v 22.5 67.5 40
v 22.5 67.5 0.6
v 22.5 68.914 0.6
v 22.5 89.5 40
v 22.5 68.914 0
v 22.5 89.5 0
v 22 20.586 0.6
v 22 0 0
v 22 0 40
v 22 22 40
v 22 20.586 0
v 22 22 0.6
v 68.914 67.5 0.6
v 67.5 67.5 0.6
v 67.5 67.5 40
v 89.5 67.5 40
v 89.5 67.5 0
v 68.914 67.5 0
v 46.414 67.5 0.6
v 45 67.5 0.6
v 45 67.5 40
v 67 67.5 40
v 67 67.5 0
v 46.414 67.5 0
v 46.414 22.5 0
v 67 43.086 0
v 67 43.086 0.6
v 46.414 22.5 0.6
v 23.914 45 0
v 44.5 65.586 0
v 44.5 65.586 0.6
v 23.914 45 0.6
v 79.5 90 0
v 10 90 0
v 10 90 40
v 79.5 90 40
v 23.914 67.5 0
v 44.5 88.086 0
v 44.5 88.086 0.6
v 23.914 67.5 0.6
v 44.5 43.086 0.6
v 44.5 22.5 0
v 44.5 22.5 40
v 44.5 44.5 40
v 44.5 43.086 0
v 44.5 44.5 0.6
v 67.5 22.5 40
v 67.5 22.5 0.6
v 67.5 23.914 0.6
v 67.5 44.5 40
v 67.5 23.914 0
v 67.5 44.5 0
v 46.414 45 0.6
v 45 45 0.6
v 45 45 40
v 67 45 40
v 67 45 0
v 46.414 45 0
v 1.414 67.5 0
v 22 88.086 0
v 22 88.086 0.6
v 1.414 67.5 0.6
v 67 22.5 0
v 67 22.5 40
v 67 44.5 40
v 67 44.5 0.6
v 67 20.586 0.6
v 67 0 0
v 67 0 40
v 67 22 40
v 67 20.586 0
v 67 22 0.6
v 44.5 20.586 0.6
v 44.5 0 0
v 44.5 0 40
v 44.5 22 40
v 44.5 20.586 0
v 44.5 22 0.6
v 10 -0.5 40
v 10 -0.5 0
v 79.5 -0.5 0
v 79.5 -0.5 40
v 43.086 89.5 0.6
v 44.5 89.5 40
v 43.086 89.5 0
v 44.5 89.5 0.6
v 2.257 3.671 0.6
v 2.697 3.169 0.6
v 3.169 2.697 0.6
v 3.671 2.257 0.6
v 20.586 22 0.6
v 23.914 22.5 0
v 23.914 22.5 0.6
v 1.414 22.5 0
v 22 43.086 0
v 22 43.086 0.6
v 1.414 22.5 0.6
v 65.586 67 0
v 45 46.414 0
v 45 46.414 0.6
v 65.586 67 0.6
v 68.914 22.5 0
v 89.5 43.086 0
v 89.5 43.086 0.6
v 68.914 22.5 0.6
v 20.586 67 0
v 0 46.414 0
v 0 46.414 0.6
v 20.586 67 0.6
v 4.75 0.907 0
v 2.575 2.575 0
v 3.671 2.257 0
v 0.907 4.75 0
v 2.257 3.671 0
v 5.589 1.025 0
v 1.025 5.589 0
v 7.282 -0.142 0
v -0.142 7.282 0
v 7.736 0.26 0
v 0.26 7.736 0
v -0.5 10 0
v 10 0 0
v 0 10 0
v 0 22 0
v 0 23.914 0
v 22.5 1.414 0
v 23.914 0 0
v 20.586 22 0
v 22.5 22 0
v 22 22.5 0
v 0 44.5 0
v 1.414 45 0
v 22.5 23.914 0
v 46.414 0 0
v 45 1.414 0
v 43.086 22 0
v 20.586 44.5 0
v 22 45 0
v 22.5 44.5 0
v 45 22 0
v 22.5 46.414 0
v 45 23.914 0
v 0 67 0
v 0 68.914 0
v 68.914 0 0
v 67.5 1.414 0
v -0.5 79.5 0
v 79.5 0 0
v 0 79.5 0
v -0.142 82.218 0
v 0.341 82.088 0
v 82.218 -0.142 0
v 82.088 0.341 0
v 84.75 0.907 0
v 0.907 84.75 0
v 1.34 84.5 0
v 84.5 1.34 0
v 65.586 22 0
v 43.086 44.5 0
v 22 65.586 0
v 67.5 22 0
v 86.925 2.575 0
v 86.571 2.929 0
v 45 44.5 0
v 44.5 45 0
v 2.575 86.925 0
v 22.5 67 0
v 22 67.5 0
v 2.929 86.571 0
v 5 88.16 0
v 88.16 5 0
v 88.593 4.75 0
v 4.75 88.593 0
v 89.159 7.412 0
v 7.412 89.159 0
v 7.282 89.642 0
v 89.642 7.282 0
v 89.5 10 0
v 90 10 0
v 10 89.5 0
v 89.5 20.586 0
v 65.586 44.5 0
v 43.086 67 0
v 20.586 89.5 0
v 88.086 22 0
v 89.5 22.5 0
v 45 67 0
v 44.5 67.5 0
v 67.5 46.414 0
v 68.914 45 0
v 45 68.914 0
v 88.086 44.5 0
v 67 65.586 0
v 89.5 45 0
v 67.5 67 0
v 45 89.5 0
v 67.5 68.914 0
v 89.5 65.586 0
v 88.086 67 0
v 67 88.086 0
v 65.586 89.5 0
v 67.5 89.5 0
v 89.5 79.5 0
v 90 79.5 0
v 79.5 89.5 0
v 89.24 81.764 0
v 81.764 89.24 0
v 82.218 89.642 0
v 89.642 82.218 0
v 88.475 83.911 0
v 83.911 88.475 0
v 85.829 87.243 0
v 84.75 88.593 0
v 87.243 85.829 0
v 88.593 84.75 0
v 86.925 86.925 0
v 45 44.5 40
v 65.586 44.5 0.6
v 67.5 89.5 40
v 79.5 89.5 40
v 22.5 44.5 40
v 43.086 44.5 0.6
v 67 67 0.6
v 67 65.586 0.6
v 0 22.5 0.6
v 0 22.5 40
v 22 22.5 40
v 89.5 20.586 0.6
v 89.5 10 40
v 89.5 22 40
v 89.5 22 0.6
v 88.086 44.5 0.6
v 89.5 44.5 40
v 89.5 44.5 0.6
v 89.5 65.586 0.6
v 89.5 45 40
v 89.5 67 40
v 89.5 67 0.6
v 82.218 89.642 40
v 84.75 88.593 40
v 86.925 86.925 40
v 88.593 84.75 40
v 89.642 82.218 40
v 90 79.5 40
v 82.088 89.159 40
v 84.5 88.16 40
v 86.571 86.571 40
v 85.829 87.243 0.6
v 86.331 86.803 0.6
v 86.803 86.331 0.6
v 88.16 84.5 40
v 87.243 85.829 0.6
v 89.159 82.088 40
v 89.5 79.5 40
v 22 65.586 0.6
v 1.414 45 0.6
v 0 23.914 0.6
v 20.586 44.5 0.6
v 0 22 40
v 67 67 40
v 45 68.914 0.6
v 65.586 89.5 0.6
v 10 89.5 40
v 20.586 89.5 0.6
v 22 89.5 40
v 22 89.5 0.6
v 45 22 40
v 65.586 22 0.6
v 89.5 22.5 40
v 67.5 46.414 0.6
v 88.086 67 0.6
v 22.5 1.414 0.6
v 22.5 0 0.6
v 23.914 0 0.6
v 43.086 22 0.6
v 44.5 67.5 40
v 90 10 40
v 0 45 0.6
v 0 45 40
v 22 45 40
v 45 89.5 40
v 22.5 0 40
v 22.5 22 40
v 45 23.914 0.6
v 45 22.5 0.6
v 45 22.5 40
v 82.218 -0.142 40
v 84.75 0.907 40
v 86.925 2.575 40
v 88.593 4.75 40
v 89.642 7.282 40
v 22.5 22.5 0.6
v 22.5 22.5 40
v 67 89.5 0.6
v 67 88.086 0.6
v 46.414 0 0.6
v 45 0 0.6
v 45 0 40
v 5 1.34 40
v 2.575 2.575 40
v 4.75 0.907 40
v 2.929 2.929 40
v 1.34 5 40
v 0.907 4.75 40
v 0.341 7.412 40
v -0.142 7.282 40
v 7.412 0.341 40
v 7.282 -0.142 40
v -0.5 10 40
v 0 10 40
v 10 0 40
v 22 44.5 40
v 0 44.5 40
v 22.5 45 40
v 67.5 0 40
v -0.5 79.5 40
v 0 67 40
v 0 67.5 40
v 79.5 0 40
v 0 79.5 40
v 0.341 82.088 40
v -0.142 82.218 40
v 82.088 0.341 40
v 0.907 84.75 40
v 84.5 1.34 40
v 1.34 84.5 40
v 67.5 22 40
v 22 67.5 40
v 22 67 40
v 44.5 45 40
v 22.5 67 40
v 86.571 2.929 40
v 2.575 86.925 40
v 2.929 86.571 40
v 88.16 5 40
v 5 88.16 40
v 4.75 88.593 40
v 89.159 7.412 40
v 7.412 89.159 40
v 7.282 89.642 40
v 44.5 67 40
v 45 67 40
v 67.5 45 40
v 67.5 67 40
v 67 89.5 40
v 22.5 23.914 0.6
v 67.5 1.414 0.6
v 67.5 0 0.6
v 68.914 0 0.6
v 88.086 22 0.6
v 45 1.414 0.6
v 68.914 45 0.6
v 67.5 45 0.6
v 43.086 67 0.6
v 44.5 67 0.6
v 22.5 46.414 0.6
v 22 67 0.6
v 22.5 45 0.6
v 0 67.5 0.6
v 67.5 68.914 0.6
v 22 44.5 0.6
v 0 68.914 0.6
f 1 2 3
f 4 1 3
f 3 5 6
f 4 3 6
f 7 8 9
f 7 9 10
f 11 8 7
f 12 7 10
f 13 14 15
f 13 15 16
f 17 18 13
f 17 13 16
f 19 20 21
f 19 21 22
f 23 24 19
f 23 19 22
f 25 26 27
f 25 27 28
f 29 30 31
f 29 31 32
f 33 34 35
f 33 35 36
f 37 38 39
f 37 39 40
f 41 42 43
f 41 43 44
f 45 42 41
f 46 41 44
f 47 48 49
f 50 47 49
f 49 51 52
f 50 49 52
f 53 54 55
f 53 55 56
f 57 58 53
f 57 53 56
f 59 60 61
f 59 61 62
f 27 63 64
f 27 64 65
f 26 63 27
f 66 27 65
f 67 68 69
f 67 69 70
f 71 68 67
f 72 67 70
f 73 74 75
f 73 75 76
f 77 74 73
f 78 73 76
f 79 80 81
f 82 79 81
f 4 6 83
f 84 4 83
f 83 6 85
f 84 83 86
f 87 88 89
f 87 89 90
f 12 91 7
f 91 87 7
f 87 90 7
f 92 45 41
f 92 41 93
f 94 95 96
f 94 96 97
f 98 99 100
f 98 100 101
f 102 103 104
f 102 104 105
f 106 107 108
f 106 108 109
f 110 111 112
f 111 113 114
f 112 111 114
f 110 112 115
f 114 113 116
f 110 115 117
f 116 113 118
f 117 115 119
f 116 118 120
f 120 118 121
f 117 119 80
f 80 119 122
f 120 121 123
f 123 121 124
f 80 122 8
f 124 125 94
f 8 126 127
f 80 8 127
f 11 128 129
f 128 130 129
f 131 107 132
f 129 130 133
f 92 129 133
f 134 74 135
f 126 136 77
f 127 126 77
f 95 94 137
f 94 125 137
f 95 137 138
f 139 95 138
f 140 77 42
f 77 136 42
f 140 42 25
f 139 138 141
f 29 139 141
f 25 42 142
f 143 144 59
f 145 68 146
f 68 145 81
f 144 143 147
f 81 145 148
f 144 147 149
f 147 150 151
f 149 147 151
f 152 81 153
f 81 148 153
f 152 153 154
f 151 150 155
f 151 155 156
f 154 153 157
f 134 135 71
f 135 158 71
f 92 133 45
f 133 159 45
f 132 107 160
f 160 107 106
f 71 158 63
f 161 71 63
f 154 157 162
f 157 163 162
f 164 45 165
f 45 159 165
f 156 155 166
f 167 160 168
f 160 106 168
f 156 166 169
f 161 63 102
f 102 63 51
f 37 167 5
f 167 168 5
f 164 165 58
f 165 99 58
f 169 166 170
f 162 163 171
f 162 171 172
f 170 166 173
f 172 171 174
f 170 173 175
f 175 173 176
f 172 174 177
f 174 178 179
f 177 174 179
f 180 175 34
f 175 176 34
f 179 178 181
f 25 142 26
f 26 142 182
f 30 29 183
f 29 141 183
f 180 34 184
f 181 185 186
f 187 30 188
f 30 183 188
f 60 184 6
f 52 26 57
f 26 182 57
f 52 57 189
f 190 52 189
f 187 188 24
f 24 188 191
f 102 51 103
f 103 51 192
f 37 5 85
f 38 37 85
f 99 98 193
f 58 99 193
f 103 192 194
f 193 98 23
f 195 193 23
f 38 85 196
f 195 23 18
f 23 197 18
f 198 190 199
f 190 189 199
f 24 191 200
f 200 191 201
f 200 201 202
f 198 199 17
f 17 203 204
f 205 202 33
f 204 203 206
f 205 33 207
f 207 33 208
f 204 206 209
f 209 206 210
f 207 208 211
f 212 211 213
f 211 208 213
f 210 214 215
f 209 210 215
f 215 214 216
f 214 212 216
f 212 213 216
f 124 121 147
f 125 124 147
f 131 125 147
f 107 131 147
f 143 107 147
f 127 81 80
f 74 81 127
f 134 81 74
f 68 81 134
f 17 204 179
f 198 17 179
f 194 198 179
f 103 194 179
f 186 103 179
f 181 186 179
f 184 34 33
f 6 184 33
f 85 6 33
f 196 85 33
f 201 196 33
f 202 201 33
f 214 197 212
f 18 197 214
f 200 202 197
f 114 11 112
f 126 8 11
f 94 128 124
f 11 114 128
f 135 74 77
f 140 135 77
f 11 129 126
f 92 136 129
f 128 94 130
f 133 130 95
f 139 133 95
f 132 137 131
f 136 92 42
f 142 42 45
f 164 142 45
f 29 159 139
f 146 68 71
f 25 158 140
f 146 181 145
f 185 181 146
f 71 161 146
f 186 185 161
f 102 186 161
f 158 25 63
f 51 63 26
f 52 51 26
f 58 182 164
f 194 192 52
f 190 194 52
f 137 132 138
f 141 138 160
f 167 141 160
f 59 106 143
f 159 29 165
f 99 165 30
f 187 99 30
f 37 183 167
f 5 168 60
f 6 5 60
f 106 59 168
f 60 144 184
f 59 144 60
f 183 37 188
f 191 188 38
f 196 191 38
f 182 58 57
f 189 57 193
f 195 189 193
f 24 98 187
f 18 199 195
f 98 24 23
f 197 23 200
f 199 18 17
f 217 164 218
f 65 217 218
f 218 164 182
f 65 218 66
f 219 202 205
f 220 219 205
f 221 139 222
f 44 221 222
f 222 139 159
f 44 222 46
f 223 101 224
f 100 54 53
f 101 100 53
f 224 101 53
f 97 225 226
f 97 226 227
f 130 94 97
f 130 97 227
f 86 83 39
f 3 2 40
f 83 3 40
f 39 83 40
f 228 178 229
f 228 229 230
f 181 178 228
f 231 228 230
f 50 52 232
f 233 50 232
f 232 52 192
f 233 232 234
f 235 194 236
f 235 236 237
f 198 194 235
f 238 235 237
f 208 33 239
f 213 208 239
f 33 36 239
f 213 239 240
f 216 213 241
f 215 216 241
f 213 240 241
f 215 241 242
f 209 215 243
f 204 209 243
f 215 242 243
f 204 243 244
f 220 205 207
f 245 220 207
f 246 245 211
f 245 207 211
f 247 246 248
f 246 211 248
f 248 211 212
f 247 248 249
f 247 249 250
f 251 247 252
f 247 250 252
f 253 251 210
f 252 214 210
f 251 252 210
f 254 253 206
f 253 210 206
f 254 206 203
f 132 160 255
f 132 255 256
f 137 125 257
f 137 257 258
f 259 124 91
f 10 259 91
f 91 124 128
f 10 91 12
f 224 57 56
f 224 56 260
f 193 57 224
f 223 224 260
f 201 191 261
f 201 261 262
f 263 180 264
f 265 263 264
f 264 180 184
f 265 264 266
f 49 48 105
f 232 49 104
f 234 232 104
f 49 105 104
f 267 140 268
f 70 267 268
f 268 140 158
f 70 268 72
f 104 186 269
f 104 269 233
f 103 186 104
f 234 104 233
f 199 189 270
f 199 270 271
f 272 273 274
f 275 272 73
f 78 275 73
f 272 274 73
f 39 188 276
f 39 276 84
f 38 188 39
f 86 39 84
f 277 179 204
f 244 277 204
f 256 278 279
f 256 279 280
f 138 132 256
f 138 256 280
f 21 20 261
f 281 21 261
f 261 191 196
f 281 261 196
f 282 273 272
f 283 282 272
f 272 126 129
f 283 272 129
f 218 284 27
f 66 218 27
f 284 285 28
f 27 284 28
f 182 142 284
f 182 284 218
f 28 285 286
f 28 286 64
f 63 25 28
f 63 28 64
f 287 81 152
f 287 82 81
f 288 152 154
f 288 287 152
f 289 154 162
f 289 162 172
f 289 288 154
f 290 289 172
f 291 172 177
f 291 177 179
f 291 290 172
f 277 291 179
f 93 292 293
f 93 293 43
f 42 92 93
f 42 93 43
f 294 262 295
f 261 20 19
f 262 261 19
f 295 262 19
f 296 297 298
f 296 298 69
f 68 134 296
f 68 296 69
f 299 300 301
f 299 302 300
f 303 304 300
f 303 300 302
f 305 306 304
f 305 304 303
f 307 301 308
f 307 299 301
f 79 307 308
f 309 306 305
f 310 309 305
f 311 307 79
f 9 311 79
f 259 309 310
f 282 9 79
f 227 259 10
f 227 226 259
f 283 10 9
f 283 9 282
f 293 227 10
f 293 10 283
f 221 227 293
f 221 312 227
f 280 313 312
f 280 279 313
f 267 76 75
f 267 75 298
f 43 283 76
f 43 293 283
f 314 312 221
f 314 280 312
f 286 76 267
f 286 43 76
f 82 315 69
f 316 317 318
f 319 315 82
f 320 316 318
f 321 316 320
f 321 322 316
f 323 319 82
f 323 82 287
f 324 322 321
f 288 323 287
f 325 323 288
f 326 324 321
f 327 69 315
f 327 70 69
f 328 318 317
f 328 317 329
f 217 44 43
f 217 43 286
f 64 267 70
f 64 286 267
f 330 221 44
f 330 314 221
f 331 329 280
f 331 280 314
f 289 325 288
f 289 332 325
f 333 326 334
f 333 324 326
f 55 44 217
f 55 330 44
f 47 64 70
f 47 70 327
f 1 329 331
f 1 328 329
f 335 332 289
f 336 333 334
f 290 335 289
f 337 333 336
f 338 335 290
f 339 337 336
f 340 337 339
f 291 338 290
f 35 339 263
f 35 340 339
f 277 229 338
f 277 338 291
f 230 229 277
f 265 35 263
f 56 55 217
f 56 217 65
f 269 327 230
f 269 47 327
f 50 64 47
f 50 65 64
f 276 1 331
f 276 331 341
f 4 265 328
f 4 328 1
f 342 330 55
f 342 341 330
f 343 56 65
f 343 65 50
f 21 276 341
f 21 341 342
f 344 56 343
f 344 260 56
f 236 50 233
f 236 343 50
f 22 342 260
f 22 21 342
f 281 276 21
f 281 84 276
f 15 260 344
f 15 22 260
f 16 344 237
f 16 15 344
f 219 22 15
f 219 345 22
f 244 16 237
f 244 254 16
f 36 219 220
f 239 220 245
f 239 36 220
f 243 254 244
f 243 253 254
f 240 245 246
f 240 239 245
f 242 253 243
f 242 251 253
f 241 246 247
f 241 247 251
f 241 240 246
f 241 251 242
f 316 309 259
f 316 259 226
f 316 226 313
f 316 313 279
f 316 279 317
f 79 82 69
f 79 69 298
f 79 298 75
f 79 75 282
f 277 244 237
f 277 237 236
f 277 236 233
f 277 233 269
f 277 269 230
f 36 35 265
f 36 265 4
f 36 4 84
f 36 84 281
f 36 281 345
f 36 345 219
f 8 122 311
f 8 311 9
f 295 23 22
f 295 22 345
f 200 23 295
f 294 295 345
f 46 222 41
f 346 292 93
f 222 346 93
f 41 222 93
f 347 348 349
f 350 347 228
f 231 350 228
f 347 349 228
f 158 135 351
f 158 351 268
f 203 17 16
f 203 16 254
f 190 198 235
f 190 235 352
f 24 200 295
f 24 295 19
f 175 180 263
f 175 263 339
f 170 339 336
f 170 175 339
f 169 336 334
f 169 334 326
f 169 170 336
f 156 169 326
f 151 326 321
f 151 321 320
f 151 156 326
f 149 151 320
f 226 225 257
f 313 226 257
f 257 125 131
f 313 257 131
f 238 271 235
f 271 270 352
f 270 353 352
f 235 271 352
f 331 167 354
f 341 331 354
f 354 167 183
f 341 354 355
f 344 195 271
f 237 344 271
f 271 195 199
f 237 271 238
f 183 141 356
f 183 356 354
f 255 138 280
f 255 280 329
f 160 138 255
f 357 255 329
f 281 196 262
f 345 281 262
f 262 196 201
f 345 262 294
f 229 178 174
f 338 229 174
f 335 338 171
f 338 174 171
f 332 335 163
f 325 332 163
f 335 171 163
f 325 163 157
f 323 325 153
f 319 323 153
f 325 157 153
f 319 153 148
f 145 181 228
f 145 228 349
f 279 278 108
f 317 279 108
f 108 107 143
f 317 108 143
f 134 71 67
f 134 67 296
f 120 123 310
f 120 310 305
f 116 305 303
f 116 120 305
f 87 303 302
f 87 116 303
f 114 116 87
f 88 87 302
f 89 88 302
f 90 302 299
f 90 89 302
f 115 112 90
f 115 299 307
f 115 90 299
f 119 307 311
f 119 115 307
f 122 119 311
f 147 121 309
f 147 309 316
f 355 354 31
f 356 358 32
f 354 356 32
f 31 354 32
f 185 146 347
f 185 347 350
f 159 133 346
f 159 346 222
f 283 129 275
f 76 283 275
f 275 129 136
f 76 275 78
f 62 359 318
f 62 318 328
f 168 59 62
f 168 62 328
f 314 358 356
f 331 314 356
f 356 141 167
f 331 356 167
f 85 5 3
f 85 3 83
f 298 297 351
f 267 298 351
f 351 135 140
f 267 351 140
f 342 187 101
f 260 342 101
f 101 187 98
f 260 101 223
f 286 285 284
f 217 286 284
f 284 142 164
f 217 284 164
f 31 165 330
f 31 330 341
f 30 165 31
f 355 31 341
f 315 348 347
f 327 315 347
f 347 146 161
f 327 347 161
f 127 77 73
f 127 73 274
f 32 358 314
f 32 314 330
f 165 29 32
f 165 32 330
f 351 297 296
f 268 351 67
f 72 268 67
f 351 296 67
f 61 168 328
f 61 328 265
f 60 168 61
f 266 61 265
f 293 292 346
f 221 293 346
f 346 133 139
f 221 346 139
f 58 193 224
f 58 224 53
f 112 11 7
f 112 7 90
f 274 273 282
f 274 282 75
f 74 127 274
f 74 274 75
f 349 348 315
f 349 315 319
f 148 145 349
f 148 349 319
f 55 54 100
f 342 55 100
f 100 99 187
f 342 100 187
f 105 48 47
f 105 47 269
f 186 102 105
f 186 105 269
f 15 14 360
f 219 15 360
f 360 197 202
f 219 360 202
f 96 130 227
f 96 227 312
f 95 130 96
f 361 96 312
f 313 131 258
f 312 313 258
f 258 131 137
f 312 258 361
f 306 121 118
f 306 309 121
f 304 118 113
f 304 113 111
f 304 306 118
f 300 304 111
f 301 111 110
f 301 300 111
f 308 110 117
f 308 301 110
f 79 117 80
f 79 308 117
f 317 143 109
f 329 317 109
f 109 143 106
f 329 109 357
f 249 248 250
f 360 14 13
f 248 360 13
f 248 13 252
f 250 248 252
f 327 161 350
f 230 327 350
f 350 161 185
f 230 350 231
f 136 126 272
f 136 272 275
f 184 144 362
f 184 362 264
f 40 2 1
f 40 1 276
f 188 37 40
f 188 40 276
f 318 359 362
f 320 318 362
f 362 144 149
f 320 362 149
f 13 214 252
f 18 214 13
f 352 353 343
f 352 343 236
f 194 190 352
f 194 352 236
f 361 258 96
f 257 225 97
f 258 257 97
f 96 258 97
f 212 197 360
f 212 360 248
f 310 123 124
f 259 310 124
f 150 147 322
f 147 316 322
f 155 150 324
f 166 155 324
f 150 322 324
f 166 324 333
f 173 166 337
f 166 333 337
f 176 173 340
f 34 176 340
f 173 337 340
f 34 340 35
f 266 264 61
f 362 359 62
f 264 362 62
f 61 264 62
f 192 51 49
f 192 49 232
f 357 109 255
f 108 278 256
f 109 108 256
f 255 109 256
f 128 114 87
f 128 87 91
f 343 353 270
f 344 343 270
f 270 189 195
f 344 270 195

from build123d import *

# Parameters (mm, degrees)
F1_W         = 90.5
F1_H         = 90.5
F1_W_2       = 22
F1_H_2       = 22
F2_DEPTH     = 40
F4_DEPTH     = 0.6
F5_T1_DEPTH  = 40
F5_T6_DEPTH  = 64.4
F5_T11_DEPTH = 64.4
F6_R         = 10.5


# Not quite as in the source:
# - a fillet or chamfer that OpenCascade refuses, or shapes differently, is made with other operations: its cross-section is extruded or revolved along the edge and cut away or added


with BuildPart() as f2:
    # F1 (on Top) → F2 (new body)
    with BuildSketch(Plane.XY):
        with Locations((44.75, 44.75)):
            Rectangle(F1_W, F1_H)
        with Locations((11, 11)):
            Rectangle(F1_W_2, F1_H_2, mode=Mode.SUBTRACT)
        with Locations((33.5, 11)):
            Rectangle(F1_W_2, F1_H_2, mode=Mode.SUBTRACT)
        with Locations((11, 33.5)):
            Rectangle(F1_W_2, F1_H_2, mode=Mode.SUBTRACT)
        with Locations((33.5, 33.5)):
            Rectangle(F1_W_2, F1_H_2, mode=Mode.SUBTRACT)
        with Locations((56, 11)):
            Rectangle(F1_W_2, F1_H_2, mode=Mode.SUBTRACT)
        with Locations((78.5, 11)):
            Rectangle(F1_W_2, F1_H_2, mode=Mode.SUBTRACT)
        with Locations((56, 33.5)):
            Rectangle(F1_W_2, F1_H_2, mode=Mode.SUBTRACT)
        with Locations((78.5, 33.5)):
            Rectangle(F1_W_2, F1_H_2, mode=Mode.SUBTRACT)
        with Locations((11, 56)):
            Rectangle(F1_W_2, F1_H_2, mode=Mode.SUBTRACT)
        with Locations((33.5, 56)):
            Rectangle(F1_W_2, F1_H_2, mode=Mode.SUBTRACT)
        with Locations((11, 78.5)):
            Rectangle(F1_W_2, F1_H_2, mode=Mode.SUBTRACT)
        with Locations((33.5, 78.5)):
            Rectangle(F1_W_2, F1_H_2, mode=Mode.SUBTRACT)
        with Locations((56, 56)):
            Rectangle(F1_W_2, F1_H_2, mode=Mode.SUBTRACT)
        with Locations((78.5, 56)):
            Rectangle(F1_W_2, F1_H_2, mode=Mode.SUBTRACT)
        with Locations((56, 78.5)):
            Rectangle(F1_W_2, F1_H_2, mode=Mode.SUBTRACT)
        with Locations((78.5, 78.5)):
            Rectangle(F1_W_2, F1_H_2, mode=Mode.SUBTRACT)
    extrude(amount=F2_DEPTH)

    # F3 (on face) → F4 (join)
    with BuildSketch(Plane(origin=(0, 0, 0), x_dir=(1, 0, 0), z_dir=(0, 0, -1))):
        Polygon((22, -89.5), (22, -88.0857864376), (1.4142135624, -67.5), (0, -67.5), (0, -68.9142135624), (20.5857864376, -89.5), align=None)
        Polygon((22, -67), (22, -65.5857864376), (1.4142135624, -45), (0, -45), (0, -46.4142135624), (20.5857864376, -67), align=None)
        Polygon((44.5, -89.5), (44.5, -88.0857864376), (23.9142135624, -67.5), (22.5, -67.5), (22.5, -68.9142135624), (43.0857864376, -89.5), align=None)
        Polygon((22, -44.5), (22, -43.0857864376), (1.4142135624, -22.5), (0, -22.5), (0, -23.9142135624), (20.5857864376, -44.5), align=None)
        Polygon((44.5, -67), (44.5, -65.5857864376), (23.9142135624, -45), (22.5, -45), (22.5, -46.4142135624), (43.0857864376, -67), align=None)
        Polygon((67, -89.5), (67, -88.0857864376), (46.4142135624, -67.5), (45, -67.5), (45, -68.9142135624), (65.5857864376, -89.5), align=None)
        Polygon((89.5, -89.5), (89.5, -88.0857864376), (68.9142135624, -67.5), (67.5, -67.5), (67.5, -68.9142135624), (88.0857864376, -89.5), align=None)
        Polygon((67, -67), (67, -65.5857864376), (46.4142135624, -45), (45, -45), (45, -46.4142135624), (65.5857864376, -67), align=None)
        Polygon((44.5, -44.5), (44.5, -43.0857864376), (23.9142135624, -22.5), (22.5, -22.5), (22.5, -23.9142135624), (43.0857864376, -44.5), align=None)
        Polygon((22, -22), (22, -20.5857864376), (1.4142135624, 0), (0, 0), (0, -1.4142135624), (20.5857864376, -22), align=None)
        Polygon((22.5, -1.4142135624), (43.0857864376, -22), (44.5, -22), (44.5, -20.5857864376), (23.9142135624, 0), (22.5, 0), align=None)
        Polygon((45, -23.9142135624), (65.5857864376, -44.5), (67, -44.5), (67, -43.0857864376), (46.4142135624, -22.5), (45, -22.5), align=None)
        Polygon((67.5, -46.4142135624), (88.0857864376, -67), (89.5, -67), (89.5, -65.5857864376), (68.9142135624, -45), (67.5, -45), align=None)
        Polygon((67.5, -23.9142135624), (88.0857864376, -44.5), (89.5, -44.5), (89.5, -43.0857864376), (68.9142135624, -22.5), (67.5, -22.5), align=None)
        Polygon((45, -1.4142135624), (65.5857864376, -22), (67, -22), (67, -20.5857864376), (46.4142135624, 0), (45, 0), align=None)
        Polygon((67.5, -1.4142135624), (88.0857864376, -22), (89.5, -22), (89.5, -20.5857864376), (68.9142135624, 0), (67.5, 0), align=None)
    extrude(amount=-F4_DEPTH)

    # F5: fillet of radius 10 on 4 edges, made by hand

    # F5_s2 → F5_t1 (join)
    with BuildSketch(Plane.XY):
        with BuildLine():
            ThreePointArc((89.5, 10), (86.5710678119, 2.9289321881), (79.5, 0))
            Line((79.5, 0), (89.5, 0))
            Line((89.5, 0), (89.5, 10))
        make_face()
        with BuildLine():
            ThreePointArc((10, 89.5), (2.9289321881, 86.5710678119), (0, 79.5))
            Line((0, 79.5), (0, 89.5))
            Line((0, 89.5), (10, 89.5))
        make_face()
    extrude(amount=F5_T1_DEPTH)


with BuildPart() as f5_tool4:
    # F5_s5 → F5_t6 (new body)
    with BuildSketch(Plane.XY.offset(-24.4)):
        with BuildLine():
            ThreePointArc((0, 10), (2.9289321881, 2.9289321881), (10, 0))
            Line((10, 0), (0, 0))
            Line((0, 0), (0, 10))
        make_face()
    extrude(amount=F5_T6_DEPTH)

    split(bisect_by=Plane.XY, keep=Keep.TOP)


with BuildPart() as f2_1:
    add(f2.part)

    # F5_t3: union F5_tool4
    add(f5_tool4.part)


with BuildPart() as f5_tool9:
    # F5_s10 → F5_t11 (new body)
    with BuildSketch(Plane.XY.offset(-24.4)):
        with BuildLine():
            ThreePointArc((79.5, 89.5), (86.5710678119, 86.5710678119), (89.5, 79.5))
            Line((89.5, 79.5), (89.5, 89.5))
            Line((89.5, 89.5), (79.5, 89.5))
        make_face()
    extrude(amount=F5_T11_DEPTH)

    split(bisect_by=Plane.XY, keep=Keep.TOP)


with BuildPart() as f2_2:
    add(f2_1.part)

    # F5_t8: union F5_tool9
    add(f5_tool9.part)

    # F6
    f6_edges = [f2_2.edges().sort_by_distance(p)[0] for p in [
        (90, -0.5, 20),
        (-0.5, -0.5, 20),
        (-0.5, 90, 20),
        (90, 90, 20),
    ]]
    fillet(f6_edges, radius=F6_R)


solid = f2_2.part
